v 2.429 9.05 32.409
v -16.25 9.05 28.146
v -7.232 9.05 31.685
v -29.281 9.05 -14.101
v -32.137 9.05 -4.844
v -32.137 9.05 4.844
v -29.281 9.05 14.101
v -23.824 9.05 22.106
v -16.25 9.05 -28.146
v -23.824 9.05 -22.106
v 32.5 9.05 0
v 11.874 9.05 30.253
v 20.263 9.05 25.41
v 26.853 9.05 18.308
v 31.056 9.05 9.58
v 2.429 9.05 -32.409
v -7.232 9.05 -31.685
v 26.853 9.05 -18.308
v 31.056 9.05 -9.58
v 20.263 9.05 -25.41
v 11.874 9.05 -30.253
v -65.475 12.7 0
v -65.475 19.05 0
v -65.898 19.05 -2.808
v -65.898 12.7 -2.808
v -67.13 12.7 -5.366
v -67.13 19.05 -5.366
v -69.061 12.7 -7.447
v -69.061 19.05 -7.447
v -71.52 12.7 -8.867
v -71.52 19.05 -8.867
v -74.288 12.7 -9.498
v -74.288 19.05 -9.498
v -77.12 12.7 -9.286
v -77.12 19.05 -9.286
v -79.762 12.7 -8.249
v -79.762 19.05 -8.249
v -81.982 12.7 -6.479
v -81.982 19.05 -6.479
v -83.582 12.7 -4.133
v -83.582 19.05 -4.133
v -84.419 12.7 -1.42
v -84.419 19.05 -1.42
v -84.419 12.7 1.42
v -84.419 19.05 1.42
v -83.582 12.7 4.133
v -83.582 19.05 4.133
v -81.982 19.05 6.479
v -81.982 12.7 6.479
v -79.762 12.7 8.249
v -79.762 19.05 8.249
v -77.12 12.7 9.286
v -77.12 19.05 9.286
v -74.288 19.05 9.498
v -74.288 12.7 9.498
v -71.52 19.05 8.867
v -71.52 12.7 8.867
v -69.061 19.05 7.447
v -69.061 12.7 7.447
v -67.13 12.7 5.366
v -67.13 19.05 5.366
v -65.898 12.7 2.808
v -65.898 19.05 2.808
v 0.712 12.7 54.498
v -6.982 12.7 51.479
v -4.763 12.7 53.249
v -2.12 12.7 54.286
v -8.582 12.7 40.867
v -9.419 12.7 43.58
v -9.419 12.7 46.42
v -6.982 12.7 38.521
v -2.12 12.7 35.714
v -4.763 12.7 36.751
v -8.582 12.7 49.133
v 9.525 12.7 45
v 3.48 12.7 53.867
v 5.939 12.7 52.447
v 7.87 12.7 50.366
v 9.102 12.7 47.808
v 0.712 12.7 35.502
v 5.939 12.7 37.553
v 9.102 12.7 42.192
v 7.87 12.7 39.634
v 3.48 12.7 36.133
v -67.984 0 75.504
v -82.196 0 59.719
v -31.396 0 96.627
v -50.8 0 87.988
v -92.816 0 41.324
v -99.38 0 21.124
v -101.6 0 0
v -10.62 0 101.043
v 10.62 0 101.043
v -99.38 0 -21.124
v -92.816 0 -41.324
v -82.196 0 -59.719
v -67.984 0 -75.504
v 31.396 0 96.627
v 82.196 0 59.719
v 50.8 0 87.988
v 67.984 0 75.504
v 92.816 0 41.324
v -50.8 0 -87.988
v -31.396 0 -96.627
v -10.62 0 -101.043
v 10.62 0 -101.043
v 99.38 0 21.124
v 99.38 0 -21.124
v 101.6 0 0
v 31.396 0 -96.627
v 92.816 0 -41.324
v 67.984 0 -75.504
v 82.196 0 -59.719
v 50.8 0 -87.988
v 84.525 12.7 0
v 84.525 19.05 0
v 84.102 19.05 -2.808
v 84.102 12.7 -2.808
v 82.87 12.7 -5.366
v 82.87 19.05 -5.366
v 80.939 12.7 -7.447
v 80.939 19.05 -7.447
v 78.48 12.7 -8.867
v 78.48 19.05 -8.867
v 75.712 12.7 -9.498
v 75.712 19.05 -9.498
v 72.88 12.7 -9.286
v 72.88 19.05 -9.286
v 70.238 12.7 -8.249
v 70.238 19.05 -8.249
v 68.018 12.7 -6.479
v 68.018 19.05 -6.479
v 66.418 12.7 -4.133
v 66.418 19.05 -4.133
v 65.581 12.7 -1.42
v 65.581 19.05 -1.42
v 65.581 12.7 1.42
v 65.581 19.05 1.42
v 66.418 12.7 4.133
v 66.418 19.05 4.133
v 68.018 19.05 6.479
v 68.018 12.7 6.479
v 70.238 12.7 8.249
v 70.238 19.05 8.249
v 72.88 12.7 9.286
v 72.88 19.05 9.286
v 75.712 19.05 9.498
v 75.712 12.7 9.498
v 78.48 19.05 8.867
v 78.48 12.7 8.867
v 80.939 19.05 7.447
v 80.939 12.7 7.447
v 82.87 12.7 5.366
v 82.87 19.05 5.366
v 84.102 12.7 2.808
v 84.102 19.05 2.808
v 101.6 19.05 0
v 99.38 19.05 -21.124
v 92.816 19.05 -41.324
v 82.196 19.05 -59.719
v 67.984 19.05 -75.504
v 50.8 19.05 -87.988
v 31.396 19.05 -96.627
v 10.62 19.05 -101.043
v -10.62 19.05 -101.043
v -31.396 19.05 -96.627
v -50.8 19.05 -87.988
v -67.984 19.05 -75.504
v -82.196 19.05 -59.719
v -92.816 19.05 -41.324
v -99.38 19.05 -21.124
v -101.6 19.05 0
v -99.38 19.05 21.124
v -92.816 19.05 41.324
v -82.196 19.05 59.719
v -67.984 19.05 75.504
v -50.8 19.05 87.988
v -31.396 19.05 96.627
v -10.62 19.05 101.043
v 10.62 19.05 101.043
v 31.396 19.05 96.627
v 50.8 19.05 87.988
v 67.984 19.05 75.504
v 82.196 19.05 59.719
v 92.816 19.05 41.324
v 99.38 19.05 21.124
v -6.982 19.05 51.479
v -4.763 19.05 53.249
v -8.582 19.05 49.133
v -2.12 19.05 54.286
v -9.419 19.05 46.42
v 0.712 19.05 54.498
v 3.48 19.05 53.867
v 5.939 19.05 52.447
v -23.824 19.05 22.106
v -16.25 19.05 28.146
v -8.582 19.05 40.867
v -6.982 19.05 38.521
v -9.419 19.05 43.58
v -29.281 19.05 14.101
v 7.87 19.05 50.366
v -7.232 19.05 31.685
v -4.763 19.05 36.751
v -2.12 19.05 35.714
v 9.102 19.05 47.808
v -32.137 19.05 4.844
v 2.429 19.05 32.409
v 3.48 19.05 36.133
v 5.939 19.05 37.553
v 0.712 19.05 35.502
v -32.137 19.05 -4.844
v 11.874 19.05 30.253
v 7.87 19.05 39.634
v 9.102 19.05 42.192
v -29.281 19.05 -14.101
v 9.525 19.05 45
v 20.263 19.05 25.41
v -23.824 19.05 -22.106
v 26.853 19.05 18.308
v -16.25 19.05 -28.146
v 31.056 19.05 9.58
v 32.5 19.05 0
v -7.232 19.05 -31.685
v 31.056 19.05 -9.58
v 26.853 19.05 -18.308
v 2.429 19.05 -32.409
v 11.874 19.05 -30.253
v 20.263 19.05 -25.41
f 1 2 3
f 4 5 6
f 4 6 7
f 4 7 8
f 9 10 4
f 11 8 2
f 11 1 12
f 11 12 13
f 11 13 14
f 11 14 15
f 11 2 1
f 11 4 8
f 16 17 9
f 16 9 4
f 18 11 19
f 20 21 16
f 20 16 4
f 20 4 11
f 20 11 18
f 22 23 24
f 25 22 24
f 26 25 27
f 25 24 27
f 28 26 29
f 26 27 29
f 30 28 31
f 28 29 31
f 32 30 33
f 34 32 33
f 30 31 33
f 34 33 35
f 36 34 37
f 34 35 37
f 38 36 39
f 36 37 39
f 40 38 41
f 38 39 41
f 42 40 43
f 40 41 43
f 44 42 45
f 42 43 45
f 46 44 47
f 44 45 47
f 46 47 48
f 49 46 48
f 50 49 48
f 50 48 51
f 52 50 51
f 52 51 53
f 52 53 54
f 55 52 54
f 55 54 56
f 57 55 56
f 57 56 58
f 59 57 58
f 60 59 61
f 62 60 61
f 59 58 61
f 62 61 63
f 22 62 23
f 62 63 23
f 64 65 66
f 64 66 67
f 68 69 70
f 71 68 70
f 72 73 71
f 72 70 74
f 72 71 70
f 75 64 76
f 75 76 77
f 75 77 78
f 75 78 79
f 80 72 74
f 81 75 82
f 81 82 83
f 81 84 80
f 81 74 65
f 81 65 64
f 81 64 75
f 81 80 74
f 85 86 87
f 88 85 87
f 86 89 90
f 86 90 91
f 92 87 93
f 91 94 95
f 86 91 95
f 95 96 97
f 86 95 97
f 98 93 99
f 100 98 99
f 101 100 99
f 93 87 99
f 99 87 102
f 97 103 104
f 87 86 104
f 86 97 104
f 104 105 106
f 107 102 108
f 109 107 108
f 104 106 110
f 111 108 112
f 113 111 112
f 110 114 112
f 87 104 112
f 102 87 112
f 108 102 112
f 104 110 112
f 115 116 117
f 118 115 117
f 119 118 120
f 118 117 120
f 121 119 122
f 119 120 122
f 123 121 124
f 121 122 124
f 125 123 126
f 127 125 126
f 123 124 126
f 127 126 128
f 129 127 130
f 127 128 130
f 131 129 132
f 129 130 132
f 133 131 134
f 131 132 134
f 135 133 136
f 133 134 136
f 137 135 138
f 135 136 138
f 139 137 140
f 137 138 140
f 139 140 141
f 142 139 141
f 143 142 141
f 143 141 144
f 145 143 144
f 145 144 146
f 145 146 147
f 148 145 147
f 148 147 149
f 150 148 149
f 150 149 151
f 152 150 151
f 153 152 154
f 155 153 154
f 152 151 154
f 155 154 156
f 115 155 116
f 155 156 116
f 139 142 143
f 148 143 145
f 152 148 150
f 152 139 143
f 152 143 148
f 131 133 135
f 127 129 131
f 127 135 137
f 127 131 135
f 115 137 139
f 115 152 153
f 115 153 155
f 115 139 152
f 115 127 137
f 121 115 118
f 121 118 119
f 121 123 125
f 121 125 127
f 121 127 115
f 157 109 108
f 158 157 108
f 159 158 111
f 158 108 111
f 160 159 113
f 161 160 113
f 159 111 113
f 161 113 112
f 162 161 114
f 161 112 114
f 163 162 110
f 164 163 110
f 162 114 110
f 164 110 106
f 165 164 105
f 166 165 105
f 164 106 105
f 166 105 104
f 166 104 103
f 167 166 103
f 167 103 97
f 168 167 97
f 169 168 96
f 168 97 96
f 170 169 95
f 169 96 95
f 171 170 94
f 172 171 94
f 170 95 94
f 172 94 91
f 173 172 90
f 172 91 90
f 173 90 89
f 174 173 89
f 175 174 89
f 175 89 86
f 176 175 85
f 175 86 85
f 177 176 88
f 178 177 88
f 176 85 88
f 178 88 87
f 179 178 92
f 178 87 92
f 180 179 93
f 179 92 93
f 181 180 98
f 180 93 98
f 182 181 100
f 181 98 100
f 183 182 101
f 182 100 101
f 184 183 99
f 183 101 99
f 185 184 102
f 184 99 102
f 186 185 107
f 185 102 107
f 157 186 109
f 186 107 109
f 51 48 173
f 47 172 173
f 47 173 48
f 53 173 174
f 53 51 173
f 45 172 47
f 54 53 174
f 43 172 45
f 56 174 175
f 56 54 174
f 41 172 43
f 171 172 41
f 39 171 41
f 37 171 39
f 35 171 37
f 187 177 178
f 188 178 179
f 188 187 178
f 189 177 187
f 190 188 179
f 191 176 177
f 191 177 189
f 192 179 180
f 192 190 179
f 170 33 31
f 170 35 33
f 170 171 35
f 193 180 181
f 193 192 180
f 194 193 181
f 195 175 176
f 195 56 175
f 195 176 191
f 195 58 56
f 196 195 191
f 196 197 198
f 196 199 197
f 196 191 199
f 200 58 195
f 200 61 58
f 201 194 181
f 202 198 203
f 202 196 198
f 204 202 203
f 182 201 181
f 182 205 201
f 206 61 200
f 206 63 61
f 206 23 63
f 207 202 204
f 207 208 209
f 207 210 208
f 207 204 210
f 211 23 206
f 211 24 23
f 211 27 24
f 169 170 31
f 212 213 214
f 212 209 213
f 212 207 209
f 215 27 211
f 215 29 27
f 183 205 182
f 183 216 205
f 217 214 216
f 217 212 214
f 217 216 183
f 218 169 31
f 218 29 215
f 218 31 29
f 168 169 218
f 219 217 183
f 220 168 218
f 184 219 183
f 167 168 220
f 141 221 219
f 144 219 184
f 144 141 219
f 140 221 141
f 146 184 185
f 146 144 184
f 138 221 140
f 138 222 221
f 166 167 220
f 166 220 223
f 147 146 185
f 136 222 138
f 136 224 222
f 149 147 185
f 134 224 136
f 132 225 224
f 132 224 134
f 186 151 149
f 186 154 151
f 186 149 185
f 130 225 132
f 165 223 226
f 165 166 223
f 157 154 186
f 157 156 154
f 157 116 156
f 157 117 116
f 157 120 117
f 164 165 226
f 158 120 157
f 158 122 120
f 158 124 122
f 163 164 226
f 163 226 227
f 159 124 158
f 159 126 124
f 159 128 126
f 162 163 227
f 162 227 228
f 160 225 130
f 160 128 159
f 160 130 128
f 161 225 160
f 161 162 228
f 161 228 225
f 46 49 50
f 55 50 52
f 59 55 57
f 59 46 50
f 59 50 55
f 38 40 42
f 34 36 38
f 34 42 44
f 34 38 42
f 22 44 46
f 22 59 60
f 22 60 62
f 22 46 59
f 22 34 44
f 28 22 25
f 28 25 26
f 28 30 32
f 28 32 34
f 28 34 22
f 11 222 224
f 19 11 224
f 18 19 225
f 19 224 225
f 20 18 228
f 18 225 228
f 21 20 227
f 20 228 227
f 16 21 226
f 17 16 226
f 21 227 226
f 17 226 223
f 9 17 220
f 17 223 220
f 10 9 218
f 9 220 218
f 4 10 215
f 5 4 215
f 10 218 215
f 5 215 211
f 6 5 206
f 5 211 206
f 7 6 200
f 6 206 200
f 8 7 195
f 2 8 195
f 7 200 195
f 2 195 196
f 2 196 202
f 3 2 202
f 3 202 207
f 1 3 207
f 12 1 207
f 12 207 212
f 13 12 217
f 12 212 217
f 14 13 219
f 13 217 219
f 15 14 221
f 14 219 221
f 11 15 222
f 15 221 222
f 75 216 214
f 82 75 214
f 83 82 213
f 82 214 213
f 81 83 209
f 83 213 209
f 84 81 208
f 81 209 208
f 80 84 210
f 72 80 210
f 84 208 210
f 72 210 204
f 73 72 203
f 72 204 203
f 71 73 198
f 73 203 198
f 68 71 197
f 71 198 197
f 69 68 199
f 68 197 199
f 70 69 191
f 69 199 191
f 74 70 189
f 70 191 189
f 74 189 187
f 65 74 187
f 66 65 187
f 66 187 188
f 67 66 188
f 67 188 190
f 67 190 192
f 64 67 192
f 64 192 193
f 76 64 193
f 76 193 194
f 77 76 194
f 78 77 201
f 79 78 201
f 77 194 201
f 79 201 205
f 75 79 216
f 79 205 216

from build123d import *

# Parameters (mm, degrees)
SKETCH1_R           = 101.6
BOSS_EXTRUDE1_DEPTH = 19.05
SKETCH2_R           = 32.5
CUT_EXTRUDE1_DEPTH  = 10
SKETCH4_R           = 9.525
CUT_EXTRUDE3_DEPTH  = 6.35
SKETCH5_R           = 9.525
CUT_EXTRUDE4_DEPTH  = 6.35
SKETCH6_R           = 9.525
CUT_EXTRUDE5_DEPTH  = 6.35


with BuildPart() as part:
    # Sketch1 → Boss-Extrude1 (new body)
    with BuildSketch(Plane(origin=(0, 0, 0), x_dir=(1, 0, 0), z_dir=(0, 1, 0))):
        Circle(SKETCH1_R)
    extrude(amount=BOSS_EXTRUDE1_DEPTH)

    # Sketch2 → Cut-Extrude1 (cut)
    with BuildSketch(Plane(origin=(0, 19.05, 0), x_dir=(1, 0, 0), z_dir=(0, 1, 0))):
        Circle(SKETCH2_R)
    extrude(amount=-CUT_EXTRUDE1_DEPTH, mode=Mode.SUBTRACT)

    # Sketch4 → Cut-Extrude3 (cut)
    with BuildSketch(Plane(origin=(0, 19.05, 0), x_dir=(1, 0, 0), z_dir=(0, 1, 0))):
        with Locations((-75, 0)):
            Circle(SKETCH4_R)
    extrude(amount=-CUT_EXTRUDE3_DEPTH, mode=Mode.SUBTRACT)

    # Sketch5 → Cut-Extrude4 (cut)
    with BuildSketch(Plane(origin=(0, 19.05, 0), x_dir=(1, 0, 0), z_dir=(0, 1, 0))):
        with Locations((75, 0)):
            Circle(SKETCH5_R)
    extrude(amount=-CUT_EXTRUDE4_DEPTH, mode=Mode.SUBTRACT)

    # Sketch6 → Cut-Extrude5 (cut)
    with BuildSketch(Plane(origin=(0, 19.05, 0), x_dir=(1, 0, 0), z_dir=(0, 1, 0))):
        with Locations((0, -45)):
            Circle(SKETCH6_R)
    extrude(amount=-CUT_EXTRUDE5_DEPTH, mode=Mode.SUBTRACT)


solid = part.part
